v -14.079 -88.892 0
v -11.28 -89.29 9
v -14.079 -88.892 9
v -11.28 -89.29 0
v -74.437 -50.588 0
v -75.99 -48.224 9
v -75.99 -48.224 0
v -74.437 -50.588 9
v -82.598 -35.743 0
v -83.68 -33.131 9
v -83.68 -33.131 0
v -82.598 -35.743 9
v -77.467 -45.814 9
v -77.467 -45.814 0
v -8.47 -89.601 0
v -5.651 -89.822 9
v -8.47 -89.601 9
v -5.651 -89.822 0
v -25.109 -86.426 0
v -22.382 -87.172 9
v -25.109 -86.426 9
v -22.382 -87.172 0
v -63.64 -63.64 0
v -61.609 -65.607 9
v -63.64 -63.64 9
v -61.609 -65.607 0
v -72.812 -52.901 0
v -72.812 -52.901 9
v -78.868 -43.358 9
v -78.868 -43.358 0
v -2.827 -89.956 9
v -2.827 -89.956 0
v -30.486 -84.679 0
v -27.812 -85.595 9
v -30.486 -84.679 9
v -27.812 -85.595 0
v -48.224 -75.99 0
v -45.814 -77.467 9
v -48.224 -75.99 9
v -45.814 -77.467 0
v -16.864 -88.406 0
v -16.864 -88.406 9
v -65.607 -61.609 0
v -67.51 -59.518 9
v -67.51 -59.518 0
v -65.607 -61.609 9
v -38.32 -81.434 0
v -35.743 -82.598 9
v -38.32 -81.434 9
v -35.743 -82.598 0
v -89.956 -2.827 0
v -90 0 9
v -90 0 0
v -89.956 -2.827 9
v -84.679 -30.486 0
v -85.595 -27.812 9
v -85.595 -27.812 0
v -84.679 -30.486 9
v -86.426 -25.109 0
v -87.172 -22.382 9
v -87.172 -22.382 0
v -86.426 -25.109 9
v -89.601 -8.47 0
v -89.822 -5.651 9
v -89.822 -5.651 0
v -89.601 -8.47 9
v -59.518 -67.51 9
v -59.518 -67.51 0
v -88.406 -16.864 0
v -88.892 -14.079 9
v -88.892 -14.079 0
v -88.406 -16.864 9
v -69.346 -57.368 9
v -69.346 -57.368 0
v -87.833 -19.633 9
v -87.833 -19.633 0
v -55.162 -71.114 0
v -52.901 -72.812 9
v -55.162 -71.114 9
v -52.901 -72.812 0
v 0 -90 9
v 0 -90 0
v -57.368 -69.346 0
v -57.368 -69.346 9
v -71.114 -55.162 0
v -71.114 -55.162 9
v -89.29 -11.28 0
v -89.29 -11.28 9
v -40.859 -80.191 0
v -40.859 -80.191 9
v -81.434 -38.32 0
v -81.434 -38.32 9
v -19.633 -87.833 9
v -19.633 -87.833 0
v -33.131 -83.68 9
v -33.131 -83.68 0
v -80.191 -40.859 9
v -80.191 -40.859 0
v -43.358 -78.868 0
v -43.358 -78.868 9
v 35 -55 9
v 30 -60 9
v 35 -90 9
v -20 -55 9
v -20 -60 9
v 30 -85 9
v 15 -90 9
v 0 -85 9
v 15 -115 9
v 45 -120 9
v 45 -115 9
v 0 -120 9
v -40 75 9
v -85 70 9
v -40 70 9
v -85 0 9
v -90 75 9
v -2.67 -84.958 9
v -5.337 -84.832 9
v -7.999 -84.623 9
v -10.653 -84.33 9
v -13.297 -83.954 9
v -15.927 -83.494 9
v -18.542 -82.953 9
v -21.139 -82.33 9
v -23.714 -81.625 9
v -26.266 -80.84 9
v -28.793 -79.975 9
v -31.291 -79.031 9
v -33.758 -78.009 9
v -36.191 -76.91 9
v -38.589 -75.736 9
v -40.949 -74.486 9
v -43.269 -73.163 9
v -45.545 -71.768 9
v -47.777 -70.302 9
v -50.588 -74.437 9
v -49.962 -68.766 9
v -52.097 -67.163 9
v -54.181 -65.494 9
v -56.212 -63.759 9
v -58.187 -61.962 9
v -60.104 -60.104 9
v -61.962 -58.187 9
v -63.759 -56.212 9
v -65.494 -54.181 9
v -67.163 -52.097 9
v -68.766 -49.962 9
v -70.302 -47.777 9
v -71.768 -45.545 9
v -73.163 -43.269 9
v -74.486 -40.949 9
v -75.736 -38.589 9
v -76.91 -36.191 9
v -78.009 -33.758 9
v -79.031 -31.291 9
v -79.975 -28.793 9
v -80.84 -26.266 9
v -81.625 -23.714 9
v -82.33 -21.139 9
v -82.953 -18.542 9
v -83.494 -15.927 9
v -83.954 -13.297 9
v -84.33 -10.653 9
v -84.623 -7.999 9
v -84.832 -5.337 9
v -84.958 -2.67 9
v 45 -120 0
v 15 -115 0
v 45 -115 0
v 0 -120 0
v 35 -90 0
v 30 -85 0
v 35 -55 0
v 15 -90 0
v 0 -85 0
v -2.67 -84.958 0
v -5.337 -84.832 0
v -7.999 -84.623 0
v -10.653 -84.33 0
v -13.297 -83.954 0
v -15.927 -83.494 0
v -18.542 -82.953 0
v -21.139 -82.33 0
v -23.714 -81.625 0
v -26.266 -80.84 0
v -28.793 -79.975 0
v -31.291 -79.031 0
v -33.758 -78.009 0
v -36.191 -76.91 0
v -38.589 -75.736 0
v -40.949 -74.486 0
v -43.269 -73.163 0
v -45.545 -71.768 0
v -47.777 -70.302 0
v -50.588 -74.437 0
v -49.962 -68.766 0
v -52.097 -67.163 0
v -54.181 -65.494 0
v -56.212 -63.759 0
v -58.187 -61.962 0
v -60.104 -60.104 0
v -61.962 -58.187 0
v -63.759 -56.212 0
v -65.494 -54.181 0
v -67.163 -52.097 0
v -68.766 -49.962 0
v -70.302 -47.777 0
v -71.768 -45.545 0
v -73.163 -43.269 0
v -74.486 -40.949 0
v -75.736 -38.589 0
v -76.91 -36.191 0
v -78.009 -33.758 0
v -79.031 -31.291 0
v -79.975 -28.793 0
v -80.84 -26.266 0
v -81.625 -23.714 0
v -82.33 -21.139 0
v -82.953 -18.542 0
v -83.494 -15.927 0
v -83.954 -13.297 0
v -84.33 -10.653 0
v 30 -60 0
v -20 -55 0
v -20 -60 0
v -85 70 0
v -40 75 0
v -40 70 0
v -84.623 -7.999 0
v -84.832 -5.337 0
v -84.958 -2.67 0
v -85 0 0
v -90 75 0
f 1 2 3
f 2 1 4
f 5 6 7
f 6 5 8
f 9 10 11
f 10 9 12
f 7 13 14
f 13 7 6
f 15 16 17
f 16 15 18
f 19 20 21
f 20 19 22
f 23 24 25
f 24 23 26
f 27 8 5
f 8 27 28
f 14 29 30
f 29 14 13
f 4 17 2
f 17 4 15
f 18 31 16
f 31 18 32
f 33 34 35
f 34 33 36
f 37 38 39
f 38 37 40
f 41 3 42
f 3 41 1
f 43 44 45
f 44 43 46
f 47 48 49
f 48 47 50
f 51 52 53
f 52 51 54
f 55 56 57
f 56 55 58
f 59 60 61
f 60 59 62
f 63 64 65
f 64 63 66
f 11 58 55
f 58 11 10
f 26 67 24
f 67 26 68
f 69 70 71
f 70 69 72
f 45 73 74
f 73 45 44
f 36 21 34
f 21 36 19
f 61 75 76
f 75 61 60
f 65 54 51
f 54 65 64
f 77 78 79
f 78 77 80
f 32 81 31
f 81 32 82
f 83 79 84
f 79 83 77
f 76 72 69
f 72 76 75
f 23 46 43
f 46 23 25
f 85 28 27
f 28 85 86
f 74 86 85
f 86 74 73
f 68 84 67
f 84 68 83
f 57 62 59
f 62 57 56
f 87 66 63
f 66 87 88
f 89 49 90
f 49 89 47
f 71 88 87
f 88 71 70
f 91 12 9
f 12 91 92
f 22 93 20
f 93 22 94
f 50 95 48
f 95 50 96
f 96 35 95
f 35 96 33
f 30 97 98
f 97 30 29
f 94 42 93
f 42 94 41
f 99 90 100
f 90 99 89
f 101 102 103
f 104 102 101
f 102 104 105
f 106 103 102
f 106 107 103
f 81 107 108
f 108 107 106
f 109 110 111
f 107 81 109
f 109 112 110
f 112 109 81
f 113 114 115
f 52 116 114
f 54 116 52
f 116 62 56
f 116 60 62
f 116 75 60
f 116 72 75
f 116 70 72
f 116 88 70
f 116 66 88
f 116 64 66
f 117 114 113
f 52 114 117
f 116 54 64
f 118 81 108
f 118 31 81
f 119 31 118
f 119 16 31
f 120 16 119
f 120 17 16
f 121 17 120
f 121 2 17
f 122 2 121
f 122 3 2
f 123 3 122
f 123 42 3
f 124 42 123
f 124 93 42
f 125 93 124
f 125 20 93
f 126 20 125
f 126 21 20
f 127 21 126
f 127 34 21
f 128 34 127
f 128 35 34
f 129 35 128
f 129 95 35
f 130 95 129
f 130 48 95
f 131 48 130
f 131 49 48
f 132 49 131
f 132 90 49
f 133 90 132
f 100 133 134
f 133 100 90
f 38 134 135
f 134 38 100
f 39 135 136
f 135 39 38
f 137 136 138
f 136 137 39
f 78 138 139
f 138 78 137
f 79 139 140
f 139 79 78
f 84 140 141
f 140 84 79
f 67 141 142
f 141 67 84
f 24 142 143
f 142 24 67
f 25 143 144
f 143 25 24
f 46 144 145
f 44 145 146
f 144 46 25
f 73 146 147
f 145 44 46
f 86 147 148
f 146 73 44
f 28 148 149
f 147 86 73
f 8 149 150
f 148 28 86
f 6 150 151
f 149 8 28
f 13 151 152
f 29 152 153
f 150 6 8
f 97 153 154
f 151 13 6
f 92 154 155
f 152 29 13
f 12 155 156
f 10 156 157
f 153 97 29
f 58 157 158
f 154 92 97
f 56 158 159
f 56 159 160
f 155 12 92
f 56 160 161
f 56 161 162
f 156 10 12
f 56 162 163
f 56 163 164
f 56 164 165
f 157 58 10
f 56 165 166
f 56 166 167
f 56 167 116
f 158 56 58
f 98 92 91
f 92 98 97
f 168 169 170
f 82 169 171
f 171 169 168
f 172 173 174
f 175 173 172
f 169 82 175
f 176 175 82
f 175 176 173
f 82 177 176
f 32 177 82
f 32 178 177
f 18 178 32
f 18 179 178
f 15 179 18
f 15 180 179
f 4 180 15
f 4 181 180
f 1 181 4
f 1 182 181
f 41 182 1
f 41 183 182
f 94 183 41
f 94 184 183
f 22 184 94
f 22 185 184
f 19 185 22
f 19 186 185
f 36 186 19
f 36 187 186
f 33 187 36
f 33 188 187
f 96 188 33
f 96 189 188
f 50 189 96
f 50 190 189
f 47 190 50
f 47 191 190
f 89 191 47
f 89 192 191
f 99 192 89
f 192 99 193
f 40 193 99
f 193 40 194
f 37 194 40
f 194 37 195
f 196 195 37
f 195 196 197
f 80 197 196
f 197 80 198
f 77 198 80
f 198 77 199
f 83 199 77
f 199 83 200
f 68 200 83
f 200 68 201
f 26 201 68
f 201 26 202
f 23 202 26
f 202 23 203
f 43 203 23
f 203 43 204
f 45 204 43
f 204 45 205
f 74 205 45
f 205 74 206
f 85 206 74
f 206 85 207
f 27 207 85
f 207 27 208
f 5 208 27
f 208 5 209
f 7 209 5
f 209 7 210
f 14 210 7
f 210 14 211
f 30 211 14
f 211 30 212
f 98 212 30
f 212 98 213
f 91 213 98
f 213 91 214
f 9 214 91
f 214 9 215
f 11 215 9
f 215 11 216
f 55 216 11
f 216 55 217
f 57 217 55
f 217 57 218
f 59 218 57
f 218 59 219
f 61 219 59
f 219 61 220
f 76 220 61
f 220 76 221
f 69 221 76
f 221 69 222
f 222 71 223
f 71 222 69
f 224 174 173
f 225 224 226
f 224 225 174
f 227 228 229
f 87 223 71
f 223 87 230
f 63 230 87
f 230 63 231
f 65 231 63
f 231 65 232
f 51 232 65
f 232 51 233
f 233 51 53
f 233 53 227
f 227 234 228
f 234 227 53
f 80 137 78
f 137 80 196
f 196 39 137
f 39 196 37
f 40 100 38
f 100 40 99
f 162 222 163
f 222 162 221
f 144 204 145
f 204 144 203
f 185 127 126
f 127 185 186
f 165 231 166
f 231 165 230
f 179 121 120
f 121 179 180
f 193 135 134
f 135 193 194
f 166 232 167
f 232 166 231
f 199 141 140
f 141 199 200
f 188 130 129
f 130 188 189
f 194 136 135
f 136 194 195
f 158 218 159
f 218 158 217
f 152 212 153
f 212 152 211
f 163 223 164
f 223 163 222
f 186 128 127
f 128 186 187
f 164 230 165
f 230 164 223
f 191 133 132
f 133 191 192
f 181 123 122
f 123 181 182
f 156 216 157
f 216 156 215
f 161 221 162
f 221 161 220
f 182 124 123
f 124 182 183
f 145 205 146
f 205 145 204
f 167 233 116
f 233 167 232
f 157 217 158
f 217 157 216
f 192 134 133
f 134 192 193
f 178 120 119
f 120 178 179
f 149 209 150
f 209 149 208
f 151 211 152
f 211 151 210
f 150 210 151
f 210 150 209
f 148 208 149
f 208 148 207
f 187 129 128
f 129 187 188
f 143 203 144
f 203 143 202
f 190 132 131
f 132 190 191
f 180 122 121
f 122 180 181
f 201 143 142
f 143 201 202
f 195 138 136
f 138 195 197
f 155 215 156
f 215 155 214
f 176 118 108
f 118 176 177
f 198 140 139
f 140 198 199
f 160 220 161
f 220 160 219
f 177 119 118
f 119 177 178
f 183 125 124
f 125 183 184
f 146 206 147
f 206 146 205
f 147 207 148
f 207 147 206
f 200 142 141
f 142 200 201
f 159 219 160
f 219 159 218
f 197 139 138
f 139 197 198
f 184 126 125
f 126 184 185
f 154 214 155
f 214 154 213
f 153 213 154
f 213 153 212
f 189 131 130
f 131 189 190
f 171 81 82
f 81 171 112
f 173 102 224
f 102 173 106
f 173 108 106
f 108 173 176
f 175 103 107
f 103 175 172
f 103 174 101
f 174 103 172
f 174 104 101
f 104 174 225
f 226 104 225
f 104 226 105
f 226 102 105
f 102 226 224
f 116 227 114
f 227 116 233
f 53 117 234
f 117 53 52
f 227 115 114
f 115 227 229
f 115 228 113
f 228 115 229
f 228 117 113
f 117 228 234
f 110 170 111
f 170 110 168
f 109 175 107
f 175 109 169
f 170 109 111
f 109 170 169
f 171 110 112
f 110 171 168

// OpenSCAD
$fn = 200;
thickness = 10; // [0:100]
height = 9; // [0:100]

arc_radius = 90; //[0:250]

lip_height = 30; //[0:100]
lip_length = 35; //[0:100]
lip_depth = 50;  //[0:100]

foot_height = 50; //[0:100]
foot_length = 70; //[0:100]

module arc(r){
    difference(){
        cylinder(h=height, d=2*r);
        translate([0, 0, -1])
        cylinder(h=height+2, d=2*r - thickness);
        
        translate([0, 0, -1])
        cube([r+5, r+5, height+5]);
        translate([1, 0, -1])
        rotate([0, 0, 90])
        cube([r+5, r+5, height+5]);
        translate([0, 1, -1])
        rotate([0, 0, -90])
        cube([r+5, r+5, height+5]);
    }
}

module lip(h, length, depth){
    translate([0, -arc_radius, 0])
    union(){
        cube([h, thickness/2, height]);
        
        translate([h, 0, 0])
        cube([thickness/2, length, height]);

        translate([-(depth-h), length - thickness/2, 0])    
        cube([depth, thickness/2, height]);
    }
}

module foot(h, l){
    translate([-arc_radius, 0, 0])
    cube([thickness/2, l, height]);
    
    translate([-arc_radius, l, 0])
    cube([h, thickness/2, height]);
}

module holder(t){
    
    translate([0, -arc_radius - lip_length + thickness/2, 0])
    union(){
        translate([t, 0, 0])
        cube([30, thickness/2, height]);
        cube([t, 30, height]);
    }
}

module hook(tx, ty){ 
    
    difference(){
        cube([2*tx, ty*3, 20]);
        translate([tx/2, ty, -10])
        cube([tx, ty, 100]);
    }
}

module connector(l){

    translate([l, 0, 0])
    hook(tx=height, ty=thickness/2);
    hook(tx=height, ty=thickness/2);
    
    translate([thickness*2, 2.5, 0])
    cube([40, thickness, height*2]);
}

module AllSkyMount(){

arc(r=arc_radius);

lip(h=lip_height, length=lip_length, depth=lip_depth);

foot(h=foot_height, l=foot_length);

holder(t=15);

}

AllSkyMount();

//connector(l = 60);
